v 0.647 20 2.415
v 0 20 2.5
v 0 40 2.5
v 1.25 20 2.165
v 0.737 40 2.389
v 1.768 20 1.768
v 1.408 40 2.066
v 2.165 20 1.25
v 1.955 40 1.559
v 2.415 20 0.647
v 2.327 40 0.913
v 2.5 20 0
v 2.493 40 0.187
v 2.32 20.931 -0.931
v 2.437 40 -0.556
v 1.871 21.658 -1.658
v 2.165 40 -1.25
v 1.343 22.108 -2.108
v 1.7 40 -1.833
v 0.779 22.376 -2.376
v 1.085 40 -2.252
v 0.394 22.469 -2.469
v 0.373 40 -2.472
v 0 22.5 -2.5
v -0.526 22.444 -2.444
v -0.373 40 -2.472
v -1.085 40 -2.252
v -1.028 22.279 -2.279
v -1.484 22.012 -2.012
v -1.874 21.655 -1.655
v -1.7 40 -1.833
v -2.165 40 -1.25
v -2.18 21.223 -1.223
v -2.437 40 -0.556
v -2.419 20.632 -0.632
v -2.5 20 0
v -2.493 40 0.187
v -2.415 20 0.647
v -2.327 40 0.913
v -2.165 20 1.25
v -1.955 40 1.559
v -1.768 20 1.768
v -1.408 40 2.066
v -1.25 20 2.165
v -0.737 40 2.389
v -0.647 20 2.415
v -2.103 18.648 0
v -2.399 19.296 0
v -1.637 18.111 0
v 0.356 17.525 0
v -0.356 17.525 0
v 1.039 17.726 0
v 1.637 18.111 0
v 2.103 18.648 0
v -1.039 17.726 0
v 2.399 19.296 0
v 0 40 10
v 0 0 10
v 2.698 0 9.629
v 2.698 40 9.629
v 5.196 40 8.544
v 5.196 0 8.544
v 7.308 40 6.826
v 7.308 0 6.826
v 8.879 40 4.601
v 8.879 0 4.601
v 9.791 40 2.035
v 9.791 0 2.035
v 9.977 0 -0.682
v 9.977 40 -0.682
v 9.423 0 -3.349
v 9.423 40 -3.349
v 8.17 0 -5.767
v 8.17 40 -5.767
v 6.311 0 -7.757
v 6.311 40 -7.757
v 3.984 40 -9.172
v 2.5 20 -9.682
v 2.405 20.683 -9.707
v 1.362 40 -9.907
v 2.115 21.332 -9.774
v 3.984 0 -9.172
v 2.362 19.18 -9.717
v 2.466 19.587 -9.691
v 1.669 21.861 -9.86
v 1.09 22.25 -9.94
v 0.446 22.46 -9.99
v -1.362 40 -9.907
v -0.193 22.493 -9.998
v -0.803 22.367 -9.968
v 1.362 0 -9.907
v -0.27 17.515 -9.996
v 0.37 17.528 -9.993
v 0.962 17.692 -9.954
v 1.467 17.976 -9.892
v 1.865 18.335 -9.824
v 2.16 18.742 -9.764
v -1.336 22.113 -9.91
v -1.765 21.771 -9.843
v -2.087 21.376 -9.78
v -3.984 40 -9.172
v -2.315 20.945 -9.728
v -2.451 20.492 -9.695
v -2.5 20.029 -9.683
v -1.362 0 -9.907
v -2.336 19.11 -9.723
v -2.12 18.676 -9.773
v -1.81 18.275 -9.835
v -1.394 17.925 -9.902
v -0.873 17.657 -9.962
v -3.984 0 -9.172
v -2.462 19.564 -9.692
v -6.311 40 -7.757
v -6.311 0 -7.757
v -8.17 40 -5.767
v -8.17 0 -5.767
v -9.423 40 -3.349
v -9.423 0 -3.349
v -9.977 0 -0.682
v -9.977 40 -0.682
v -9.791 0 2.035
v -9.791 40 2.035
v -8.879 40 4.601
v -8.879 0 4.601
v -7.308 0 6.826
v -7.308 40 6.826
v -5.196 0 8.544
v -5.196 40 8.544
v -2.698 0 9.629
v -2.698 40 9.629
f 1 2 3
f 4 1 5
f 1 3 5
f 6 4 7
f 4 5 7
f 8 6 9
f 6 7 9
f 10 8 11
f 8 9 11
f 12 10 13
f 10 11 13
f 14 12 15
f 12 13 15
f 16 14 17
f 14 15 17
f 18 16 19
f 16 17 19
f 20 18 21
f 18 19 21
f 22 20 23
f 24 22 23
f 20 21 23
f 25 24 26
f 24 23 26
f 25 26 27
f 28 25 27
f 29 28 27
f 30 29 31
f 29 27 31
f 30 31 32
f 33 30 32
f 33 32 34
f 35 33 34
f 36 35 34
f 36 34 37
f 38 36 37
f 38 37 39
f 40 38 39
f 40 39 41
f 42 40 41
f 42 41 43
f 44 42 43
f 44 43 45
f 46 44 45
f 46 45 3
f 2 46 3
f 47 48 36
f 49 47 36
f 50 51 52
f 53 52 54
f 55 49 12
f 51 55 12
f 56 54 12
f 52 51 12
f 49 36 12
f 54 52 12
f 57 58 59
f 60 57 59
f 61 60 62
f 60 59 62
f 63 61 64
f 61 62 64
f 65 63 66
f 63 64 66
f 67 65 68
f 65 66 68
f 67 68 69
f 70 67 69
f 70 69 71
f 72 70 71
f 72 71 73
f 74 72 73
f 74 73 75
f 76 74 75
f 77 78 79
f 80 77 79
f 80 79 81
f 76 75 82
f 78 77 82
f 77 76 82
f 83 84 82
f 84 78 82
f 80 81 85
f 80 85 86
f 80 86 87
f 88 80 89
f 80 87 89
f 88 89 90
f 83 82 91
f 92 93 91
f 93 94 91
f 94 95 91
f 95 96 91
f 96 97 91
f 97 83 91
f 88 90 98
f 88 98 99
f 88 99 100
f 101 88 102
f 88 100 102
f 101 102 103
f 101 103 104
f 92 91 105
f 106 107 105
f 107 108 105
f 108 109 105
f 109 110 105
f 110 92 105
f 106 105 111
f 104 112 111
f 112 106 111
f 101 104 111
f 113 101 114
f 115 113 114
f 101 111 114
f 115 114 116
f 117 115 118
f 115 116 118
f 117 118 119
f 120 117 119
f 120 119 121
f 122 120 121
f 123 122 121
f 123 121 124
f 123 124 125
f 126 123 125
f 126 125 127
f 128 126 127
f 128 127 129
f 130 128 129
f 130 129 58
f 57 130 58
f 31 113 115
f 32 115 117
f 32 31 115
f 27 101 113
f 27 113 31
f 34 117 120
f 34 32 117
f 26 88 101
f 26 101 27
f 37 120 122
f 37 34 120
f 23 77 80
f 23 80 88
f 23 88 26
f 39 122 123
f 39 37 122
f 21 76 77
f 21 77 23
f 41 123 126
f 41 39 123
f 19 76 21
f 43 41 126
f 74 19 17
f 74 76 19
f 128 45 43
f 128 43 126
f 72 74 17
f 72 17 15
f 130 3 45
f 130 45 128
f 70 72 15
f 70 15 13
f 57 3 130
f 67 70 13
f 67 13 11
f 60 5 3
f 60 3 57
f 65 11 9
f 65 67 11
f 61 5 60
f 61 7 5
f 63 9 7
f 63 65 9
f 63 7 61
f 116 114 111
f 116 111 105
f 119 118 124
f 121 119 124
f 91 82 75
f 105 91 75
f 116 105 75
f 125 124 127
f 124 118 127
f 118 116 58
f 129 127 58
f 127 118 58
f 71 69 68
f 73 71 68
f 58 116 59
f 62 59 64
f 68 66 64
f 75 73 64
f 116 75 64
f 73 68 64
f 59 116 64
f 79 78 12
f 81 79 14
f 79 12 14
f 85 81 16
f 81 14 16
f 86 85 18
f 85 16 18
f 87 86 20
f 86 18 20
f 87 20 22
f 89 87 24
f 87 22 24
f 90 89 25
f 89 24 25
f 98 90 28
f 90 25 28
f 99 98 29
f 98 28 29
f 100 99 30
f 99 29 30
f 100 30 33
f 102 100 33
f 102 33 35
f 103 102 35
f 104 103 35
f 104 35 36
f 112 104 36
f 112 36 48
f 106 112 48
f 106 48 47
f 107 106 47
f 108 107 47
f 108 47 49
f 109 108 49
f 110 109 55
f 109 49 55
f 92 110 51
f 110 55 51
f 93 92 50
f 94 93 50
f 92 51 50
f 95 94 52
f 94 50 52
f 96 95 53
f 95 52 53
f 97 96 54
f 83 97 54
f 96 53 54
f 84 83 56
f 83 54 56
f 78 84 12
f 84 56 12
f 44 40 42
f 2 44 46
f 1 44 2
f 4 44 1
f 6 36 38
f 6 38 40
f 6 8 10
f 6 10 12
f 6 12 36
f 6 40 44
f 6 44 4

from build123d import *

# Parameters (mm, degrees)
SKETCH_1_R          = 10
EXTRUDE_1_DEPTH     = 40
SKETCH_3_R          = 2.5
CUT_EXTRUDE_8_DEPTH = 20
SKETCH_4_R          = 2.5
CUT_EXTRUDE_9_DEPTH = 20


with BuildPart() as part:
    # 草图1 → 凸台-拉伸1 (new body)
    with BuildSketch(Plane(origin=(0, 0, 0), x_dir=(1, 0, 0), z_dir=(0, 1, 0))):
        with Locations(Location((0, 0, 0), (0, 0, 270))):
            Circle(SKETCH_1_R)
    extrude(amount=EXTRUDE_1_DEPTH)

    # 草图3 → 切除-拉伸8 (cut)
    with BuildSketch(Plane(origin=(0, 40, 0), x_dir=(1, 0, 0), z_dir=(0, 1, 0))):
        with Locations(Location((0, 0, 0), (0, 0, 270))):
            Circle(SKETCH_3_R)
    extrude(amount=-CUT_EXTRUDE_8_DEPTH, mode=Mode.SUBTRACT)

    # 草图4 → 切除-拉伸9 (cut)
    with BuildSketch(Plane.XY):
        with Locations((0, 20)):
            Circle(SKETCH_4_R)
    extrude(amount=-CUT_EXTRUDE_9_DEPTH, mode=Mode.SUBTRACT)


solid = part.part
